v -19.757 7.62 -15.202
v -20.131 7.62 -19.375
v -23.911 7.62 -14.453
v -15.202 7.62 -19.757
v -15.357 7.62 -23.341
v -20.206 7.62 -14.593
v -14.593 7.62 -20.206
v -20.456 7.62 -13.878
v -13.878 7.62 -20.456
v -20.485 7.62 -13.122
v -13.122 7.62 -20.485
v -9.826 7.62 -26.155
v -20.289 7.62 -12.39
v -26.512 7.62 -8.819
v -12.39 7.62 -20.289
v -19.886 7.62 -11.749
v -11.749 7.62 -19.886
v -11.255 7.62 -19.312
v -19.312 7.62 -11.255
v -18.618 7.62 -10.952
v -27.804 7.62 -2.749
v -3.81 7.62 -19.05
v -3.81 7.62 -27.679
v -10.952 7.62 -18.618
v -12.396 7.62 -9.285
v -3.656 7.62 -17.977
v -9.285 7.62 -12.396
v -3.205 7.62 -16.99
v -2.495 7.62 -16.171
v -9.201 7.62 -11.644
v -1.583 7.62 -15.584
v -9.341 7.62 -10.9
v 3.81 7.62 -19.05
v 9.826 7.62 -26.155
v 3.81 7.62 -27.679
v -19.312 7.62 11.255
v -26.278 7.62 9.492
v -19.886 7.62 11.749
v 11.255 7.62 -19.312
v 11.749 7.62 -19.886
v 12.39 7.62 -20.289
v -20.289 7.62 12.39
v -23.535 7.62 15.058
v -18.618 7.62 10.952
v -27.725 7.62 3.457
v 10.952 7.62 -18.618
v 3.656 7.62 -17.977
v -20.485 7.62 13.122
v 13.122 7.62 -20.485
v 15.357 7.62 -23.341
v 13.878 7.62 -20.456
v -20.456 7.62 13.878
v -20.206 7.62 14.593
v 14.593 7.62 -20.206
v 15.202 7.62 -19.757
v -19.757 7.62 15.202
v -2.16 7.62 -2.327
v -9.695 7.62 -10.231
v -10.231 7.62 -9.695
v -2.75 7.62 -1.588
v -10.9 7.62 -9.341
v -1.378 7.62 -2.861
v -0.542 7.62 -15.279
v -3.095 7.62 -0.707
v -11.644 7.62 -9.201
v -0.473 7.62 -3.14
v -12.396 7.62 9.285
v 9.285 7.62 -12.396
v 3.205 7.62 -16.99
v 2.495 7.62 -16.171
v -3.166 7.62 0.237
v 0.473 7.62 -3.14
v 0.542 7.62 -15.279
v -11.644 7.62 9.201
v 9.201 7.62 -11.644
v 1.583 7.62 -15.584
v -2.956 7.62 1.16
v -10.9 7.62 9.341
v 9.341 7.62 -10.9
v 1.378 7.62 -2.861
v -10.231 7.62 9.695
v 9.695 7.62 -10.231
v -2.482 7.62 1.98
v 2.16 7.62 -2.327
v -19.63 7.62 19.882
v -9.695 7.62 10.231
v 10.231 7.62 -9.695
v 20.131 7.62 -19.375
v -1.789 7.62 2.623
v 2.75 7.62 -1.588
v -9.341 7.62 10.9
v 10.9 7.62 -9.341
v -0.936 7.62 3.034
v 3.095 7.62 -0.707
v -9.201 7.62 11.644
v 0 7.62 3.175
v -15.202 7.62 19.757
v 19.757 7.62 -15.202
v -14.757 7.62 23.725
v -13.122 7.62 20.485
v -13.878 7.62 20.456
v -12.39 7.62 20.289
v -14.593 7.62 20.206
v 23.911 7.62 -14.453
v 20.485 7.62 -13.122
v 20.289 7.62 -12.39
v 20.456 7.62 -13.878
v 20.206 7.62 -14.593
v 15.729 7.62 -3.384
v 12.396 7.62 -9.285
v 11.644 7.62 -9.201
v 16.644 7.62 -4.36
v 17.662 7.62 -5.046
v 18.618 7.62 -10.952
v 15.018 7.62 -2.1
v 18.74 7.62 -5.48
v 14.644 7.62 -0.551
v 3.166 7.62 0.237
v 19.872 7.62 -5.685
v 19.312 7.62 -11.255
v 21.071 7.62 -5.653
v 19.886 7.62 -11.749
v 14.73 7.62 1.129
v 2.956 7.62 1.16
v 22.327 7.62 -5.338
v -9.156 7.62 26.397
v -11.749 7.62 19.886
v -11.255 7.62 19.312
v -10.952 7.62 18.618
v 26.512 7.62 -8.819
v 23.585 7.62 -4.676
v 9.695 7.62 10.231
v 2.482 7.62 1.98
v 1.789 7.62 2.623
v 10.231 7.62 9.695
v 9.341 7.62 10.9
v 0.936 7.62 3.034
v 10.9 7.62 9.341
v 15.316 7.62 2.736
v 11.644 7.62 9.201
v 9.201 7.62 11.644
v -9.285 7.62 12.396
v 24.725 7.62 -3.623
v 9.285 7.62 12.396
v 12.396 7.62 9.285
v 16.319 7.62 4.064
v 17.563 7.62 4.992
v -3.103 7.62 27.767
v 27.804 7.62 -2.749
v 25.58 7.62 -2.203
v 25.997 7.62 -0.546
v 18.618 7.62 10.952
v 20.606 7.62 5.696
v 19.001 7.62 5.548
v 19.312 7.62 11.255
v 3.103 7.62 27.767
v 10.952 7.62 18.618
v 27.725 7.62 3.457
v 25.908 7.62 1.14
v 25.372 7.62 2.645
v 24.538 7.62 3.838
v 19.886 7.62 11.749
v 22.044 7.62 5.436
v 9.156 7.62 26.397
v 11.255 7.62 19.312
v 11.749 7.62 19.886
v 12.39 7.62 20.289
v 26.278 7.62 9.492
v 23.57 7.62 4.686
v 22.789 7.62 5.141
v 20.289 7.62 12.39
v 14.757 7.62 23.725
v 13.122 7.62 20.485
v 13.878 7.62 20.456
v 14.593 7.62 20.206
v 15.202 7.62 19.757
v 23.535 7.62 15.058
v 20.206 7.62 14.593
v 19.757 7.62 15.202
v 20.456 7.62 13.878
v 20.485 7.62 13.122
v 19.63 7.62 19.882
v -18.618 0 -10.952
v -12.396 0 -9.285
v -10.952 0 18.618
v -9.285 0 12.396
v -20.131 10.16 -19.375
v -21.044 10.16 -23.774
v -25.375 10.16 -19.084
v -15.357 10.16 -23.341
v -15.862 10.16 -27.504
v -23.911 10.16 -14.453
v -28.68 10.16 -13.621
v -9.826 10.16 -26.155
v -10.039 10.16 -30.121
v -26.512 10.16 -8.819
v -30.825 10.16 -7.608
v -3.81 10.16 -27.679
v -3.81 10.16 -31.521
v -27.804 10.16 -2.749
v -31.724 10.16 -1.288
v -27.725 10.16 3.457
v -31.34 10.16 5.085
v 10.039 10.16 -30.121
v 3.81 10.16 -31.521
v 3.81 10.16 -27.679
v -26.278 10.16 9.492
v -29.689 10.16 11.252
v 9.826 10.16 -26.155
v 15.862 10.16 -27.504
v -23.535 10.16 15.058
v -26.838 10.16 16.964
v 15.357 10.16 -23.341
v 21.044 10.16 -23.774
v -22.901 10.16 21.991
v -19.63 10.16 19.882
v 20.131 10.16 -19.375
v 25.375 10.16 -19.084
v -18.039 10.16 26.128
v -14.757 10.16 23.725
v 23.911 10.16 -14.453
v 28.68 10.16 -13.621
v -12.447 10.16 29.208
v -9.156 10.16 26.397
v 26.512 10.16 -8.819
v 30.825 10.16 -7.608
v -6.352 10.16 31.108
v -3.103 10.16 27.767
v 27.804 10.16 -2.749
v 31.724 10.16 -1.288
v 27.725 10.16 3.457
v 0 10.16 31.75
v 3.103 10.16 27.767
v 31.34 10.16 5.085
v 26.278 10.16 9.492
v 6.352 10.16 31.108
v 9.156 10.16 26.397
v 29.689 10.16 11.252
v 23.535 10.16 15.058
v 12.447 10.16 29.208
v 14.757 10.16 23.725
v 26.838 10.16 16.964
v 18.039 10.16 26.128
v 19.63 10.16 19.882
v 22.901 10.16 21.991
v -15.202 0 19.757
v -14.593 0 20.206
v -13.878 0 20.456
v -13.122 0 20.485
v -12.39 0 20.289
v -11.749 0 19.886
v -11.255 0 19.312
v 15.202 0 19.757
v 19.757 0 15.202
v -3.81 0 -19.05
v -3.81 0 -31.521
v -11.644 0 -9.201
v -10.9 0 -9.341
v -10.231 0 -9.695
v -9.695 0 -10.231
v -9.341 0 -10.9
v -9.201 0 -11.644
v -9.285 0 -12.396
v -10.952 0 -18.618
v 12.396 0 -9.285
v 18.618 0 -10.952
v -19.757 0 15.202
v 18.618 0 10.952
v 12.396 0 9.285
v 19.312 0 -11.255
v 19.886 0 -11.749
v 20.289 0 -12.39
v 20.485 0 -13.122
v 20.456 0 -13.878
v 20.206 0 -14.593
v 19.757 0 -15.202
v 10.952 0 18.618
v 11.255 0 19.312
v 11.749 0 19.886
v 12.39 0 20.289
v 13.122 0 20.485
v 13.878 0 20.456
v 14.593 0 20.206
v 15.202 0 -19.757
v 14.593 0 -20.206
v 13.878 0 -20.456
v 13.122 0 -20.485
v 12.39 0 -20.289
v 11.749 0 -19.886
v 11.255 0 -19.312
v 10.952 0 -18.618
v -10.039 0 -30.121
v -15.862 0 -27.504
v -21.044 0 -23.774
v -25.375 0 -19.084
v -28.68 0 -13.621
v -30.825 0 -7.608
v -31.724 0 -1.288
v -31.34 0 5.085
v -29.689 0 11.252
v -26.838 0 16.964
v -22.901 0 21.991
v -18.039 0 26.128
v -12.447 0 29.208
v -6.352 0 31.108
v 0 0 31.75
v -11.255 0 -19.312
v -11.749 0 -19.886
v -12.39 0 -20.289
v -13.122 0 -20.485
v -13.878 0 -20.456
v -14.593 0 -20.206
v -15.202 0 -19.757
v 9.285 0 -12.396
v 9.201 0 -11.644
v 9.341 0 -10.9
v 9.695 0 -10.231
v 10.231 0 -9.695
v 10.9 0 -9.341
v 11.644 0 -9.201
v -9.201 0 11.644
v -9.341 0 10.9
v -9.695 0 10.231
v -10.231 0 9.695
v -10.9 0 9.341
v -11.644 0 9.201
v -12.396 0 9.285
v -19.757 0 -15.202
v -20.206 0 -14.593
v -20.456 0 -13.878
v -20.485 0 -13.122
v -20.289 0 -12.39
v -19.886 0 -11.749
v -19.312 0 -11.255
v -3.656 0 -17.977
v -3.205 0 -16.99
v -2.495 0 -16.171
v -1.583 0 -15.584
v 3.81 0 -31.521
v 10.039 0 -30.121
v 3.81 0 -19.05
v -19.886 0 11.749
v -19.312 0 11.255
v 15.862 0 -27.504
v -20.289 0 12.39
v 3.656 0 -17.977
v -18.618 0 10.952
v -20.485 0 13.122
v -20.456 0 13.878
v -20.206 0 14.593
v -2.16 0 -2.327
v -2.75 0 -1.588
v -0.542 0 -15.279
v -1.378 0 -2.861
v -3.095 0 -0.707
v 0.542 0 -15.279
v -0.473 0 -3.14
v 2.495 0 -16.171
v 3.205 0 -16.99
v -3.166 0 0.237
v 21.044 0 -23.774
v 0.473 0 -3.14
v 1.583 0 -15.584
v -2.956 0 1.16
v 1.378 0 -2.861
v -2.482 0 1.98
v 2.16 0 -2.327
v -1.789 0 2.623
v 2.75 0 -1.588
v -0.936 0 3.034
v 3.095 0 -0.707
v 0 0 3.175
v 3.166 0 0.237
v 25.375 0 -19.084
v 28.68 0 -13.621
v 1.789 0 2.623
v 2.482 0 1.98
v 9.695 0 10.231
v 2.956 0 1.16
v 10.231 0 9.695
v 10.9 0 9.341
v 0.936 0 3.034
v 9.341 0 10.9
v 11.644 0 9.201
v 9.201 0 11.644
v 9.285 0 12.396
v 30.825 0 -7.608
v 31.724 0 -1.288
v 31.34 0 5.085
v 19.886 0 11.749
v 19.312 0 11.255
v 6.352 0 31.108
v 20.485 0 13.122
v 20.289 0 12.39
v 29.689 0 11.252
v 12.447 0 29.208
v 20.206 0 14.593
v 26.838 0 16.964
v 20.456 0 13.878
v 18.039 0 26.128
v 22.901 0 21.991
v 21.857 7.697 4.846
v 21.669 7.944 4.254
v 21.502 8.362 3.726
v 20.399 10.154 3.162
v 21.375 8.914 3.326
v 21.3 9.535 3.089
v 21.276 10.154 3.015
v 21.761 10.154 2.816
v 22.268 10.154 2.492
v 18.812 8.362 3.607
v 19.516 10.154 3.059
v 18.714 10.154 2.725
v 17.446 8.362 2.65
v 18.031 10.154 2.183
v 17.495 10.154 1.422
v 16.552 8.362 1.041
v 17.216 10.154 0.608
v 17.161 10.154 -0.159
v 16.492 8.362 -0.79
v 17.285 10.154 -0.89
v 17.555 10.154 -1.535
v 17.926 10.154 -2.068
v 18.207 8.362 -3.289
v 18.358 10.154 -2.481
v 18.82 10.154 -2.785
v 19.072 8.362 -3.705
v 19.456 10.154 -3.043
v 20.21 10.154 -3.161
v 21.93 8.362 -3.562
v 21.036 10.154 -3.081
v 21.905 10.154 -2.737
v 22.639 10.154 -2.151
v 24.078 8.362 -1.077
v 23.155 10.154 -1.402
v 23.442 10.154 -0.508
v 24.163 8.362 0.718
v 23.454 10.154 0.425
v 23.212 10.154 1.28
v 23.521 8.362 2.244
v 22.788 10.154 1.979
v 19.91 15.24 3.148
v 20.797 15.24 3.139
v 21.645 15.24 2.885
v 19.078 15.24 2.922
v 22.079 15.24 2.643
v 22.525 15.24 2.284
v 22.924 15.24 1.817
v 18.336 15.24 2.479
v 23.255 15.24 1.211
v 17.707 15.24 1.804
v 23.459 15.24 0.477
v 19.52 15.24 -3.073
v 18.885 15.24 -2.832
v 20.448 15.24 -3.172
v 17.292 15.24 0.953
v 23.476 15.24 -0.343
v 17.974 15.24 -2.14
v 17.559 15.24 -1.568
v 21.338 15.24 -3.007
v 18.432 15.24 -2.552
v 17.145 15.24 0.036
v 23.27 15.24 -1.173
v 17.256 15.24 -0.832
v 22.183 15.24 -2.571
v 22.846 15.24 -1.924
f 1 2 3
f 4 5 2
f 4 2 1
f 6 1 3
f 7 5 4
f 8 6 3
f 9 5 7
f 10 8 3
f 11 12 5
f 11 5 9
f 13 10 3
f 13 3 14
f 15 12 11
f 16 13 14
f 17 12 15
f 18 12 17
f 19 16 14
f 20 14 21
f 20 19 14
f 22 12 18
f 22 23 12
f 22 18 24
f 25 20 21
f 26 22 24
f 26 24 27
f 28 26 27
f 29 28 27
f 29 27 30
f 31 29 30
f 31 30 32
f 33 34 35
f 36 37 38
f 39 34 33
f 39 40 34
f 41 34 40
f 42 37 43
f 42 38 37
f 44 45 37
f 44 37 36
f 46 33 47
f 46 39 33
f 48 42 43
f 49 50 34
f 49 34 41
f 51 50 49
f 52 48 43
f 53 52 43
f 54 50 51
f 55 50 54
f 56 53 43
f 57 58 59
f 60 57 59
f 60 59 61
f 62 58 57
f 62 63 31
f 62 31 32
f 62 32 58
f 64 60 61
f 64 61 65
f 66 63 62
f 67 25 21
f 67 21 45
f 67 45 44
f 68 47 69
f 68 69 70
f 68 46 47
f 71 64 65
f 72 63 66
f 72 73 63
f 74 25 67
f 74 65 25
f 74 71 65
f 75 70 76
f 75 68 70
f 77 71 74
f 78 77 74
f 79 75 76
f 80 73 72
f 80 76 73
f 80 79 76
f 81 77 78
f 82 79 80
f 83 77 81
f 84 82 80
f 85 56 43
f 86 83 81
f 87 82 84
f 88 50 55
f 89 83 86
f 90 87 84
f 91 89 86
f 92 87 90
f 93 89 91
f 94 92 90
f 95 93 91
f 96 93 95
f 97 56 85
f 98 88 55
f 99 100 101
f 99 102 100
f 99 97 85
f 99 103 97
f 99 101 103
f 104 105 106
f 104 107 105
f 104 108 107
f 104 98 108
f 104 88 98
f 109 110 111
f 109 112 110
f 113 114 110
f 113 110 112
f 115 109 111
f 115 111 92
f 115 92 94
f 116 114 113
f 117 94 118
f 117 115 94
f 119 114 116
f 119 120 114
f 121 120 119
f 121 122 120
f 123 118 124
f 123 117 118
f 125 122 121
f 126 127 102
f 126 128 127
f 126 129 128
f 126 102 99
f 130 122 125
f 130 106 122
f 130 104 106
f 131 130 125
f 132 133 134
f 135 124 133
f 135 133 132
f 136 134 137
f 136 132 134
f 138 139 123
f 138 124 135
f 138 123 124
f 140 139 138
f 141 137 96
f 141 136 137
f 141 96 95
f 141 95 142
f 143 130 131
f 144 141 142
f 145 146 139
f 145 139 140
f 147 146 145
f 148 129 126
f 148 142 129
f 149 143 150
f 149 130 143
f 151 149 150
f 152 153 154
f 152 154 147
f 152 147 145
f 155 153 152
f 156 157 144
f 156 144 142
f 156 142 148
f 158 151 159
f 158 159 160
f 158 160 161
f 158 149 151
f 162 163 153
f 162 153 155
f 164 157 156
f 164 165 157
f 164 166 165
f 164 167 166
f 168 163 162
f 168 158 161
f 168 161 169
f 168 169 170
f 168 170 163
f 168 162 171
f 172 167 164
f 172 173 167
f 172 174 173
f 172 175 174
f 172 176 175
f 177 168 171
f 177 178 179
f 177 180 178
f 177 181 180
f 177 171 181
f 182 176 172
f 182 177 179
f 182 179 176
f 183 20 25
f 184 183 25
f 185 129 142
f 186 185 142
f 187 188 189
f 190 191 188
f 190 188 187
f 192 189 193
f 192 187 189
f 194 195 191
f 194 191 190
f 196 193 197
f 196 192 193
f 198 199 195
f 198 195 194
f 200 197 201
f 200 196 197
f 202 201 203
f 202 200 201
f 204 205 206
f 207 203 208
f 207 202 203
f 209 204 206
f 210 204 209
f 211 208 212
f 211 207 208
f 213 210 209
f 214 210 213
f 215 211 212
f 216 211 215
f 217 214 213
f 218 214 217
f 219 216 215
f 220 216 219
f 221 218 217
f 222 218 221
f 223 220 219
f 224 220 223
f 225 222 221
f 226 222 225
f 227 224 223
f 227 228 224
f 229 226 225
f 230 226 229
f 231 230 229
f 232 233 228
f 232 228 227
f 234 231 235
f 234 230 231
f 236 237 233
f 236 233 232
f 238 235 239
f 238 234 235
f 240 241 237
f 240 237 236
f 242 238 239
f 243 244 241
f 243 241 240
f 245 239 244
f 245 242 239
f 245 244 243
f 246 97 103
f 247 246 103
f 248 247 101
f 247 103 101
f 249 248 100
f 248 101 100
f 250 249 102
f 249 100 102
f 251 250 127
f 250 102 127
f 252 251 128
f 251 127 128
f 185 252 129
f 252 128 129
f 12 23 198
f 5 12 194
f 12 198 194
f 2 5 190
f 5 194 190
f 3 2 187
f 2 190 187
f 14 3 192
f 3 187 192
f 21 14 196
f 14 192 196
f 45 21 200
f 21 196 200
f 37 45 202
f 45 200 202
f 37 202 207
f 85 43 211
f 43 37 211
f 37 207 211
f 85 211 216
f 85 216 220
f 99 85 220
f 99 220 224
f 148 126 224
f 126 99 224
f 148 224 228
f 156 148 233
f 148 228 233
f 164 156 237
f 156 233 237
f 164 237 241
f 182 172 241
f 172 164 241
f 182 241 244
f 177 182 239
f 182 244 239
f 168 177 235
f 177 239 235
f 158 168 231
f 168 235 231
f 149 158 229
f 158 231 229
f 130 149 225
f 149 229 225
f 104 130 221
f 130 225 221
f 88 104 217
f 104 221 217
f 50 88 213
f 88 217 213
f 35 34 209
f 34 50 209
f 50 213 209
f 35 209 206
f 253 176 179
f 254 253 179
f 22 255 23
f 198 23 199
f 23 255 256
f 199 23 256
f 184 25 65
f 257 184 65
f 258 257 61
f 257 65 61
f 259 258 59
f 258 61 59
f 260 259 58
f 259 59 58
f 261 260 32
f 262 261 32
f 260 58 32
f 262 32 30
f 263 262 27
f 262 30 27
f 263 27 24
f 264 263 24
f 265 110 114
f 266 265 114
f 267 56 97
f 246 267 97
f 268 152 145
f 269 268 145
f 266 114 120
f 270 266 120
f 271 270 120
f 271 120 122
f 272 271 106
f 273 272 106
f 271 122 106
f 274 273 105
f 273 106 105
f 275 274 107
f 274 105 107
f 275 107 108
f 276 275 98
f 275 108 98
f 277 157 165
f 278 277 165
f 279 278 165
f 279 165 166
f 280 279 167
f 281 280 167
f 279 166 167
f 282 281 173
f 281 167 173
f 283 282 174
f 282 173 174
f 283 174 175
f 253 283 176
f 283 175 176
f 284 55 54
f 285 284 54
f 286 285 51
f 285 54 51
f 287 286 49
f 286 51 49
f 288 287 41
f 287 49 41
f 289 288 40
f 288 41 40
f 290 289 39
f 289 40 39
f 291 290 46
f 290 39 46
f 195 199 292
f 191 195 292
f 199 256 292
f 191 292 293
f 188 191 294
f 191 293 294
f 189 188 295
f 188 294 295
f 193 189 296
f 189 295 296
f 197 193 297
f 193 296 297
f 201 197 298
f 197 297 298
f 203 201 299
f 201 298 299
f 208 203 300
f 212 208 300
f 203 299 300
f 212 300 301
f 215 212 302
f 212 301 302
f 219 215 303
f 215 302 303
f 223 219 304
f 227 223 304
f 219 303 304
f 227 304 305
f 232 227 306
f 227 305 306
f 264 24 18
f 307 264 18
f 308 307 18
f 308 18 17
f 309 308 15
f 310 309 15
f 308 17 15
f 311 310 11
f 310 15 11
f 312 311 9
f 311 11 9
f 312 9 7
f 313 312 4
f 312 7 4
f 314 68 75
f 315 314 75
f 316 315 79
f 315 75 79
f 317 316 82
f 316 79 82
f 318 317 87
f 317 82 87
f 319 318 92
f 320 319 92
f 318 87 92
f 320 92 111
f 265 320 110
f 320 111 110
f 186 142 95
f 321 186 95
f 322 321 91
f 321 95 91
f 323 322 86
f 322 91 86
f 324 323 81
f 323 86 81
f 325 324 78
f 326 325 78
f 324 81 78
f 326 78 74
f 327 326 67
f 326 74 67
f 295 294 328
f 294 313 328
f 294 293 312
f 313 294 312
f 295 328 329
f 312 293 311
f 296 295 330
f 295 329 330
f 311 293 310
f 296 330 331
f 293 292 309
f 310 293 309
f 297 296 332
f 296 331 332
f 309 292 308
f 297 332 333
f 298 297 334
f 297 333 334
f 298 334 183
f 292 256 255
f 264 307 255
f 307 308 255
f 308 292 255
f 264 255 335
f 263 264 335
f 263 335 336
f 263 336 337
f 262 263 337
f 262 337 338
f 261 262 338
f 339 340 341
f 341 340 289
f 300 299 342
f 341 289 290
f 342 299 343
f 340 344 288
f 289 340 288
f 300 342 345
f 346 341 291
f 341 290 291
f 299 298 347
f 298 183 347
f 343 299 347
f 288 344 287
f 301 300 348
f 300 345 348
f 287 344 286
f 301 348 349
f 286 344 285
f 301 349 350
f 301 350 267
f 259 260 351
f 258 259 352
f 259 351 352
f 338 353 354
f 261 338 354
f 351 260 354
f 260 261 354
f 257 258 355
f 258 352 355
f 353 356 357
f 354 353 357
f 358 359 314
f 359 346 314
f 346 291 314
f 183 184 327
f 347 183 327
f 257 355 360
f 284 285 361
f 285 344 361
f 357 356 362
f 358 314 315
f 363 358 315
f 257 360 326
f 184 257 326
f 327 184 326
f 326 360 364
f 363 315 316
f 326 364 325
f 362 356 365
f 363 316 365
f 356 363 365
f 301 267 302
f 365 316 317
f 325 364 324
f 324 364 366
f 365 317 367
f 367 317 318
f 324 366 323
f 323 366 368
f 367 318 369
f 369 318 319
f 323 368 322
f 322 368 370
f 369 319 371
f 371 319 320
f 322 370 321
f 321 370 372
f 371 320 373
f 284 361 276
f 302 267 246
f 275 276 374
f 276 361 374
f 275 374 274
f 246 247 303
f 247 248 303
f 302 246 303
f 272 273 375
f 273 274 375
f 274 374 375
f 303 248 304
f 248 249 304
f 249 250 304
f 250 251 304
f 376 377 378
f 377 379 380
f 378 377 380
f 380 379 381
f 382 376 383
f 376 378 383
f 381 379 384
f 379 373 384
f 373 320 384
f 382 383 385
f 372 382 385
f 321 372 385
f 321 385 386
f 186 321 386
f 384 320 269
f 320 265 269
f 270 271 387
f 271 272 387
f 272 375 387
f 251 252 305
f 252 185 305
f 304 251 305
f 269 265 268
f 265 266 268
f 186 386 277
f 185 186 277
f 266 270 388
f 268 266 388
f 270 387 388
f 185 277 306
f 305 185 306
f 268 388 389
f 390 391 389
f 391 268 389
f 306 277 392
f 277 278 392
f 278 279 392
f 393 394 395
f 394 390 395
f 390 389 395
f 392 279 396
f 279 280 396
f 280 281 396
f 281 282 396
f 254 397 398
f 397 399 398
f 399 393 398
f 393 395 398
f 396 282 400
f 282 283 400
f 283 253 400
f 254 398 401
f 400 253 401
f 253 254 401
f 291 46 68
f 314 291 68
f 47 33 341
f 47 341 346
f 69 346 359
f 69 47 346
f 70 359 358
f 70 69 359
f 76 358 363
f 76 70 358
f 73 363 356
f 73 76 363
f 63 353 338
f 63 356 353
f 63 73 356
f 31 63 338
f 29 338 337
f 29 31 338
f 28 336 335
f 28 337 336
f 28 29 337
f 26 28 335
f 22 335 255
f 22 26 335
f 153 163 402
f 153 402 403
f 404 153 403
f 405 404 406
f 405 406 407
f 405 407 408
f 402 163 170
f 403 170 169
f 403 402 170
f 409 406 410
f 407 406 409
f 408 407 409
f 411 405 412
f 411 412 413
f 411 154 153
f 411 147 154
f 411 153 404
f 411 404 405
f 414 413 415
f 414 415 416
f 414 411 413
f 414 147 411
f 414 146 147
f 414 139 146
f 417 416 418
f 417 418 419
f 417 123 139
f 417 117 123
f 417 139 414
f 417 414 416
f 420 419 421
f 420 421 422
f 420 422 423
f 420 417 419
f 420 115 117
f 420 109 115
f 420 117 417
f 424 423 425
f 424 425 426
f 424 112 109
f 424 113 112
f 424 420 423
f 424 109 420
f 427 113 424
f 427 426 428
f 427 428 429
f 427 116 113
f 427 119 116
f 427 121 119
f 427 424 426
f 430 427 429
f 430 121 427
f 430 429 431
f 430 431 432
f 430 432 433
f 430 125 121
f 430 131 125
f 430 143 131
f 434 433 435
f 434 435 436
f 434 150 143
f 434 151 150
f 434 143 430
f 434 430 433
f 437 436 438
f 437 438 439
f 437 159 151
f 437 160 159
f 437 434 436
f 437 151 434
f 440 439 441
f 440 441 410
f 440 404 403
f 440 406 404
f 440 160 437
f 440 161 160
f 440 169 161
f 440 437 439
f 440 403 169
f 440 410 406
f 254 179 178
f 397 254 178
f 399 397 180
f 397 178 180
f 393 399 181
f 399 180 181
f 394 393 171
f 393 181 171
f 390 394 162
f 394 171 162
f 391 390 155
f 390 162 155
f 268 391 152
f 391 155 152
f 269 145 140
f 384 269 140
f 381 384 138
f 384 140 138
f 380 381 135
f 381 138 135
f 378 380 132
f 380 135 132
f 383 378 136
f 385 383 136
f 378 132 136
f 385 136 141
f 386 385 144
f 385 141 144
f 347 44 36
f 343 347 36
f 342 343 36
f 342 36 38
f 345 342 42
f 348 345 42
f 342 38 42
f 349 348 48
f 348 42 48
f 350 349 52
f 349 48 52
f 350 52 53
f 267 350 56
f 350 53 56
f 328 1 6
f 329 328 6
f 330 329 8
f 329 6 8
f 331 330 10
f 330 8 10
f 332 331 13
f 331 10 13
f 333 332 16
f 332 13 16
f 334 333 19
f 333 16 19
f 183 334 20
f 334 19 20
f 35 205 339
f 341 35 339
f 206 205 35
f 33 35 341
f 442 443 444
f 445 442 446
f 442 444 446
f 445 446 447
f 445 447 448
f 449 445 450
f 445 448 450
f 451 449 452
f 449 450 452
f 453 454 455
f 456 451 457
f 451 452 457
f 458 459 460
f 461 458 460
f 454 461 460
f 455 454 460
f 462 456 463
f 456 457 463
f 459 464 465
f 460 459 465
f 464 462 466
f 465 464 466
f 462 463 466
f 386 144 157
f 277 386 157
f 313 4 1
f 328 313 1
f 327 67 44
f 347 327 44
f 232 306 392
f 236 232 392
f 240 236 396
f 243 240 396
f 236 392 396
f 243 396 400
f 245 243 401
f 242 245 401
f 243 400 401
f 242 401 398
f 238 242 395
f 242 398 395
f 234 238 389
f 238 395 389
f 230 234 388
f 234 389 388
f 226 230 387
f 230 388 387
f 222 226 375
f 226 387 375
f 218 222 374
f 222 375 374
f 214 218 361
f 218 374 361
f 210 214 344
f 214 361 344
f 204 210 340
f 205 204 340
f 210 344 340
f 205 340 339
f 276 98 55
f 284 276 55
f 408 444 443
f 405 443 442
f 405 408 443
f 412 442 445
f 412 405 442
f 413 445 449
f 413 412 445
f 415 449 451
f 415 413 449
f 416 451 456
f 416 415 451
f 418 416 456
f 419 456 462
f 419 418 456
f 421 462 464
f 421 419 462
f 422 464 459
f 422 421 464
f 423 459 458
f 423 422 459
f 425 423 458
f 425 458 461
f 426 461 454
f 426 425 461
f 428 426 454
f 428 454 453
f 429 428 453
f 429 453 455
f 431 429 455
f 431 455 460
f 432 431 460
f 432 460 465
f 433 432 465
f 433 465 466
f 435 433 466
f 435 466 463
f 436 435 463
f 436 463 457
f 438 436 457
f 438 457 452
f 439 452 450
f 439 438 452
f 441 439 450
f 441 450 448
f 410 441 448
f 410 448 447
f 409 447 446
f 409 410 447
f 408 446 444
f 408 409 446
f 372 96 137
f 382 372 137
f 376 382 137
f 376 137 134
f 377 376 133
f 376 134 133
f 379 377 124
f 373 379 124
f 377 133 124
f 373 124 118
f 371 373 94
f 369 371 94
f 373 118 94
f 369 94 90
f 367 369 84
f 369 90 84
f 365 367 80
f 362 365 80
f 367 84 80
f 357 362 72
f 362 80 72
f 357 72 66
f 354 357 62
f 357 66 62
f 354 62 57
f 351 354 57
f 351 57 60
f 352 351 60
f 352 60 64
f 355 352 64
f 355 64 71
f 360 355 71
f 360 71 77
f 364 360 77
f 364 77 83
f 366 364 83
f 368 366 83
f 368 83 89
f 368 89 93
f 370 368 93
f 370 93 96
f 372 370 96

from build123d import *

# Parameters (mm, degrees)
SKETCH1_R           = 31.75
BOSS_EXTRUDE3_DEPTH = 10.16
SKETCH3_R           = 27.94
CUT_EXTRUDE1_DEPTH  = 2.54
SKETCH4_R           = 3.175
CUT_EXTRUDE2_DEPTH  = 46.543269536
CUT_EXTRUDE3_DEPTH  = 46.543269536
CUT_EXTRUDE4_DEPTH  = 46.543269536
FILLET1_R           = 2.54


with BuildPart() as part:
    # Sketch1 → Boss-Extrude3 (new body)
    with BuildSketch(Plane(origin=(0, 0, 0), x_dir=(1, 0, 0), z_dir=(0, 1, 0))):
        with Locations(Location((0, 0, 0), (0, 0, 270))):
            Circle(SKETCH1_R)
    extrude(amount=BOSS_EXTRUDE3_DEPTH)

    # Sketch3 → Cut-Extrude1 (cut)
    with BuildSketch(Plane(origin=(0, 10.16, 0), x_dir=(1, 0, 0), z_dir=(0, 1, 0))):
        with Locations(Location((0, 0, 0), (0, 0, 270))):
            Circle(SKETCH3_R)
    extrude(amount=-CUT_EXTRUDE1_DEPTH, mode=Mode.SUBTRACT)

    # Sketch4 → Cut-Extrude2 (cut, through all)
    with BuildSketch(Plane(origin=(0, 7.62, 0), x_dir=(1, 0, 0), z_dir=(0, 1, 0))):
        with Locations(Location((0, 0, 0), (0, 0, 270))):
            Circle(SKETCH4_R)
    extrude(amount=-CUT_EXTRUDE2_DEPTH, mode=Mode.SUBTRACT)

    # Sketch5 → Cut-Extrude3 (cut, through all)
    with BuildSketch(Plane(origin=(0, 7.62, 0), x_dir=(1, 0, 0), z_dir=(0, 1, 0))):
        with BuildLine():
            Line((12.39620867, 9.285356697), (18.617912617, 10.952457245))
            ThreePointArc((18.617912617, 10.952457245), (20.413963841, 12.748508469), (19.756563466, 15.201960068))
            Line((19.756563466, 15.201960068), (15.201960068, 19.756563466))
            ThreePointArc((15.201960068, 19.756563466), (12.748508469, 20.413963841), (10.952457245, 18.617912617))
            Line((10.952457245, 18.617912617), (9.285356697, 12.39620867))
            ThreePointArc((9.285356697, 12.39620867), (9.942757071, 9.942757071), (12.39620867, 9.285356697))
        make_face()
        with BuildLine():
            Line((9.285356697, -12.39620867), (10.952457245, -18.617912617))
            ThreePointArc((10.952457245, -18.617912617), (12.748508469, -20.413963841), (15.201960068, -19.756563466))
            Line((15.201960068, -19.756563466), (19.756563466, -15.201960068))
            ThreePointArc((19.756563466, -15.201960068), (20.413963841, -12.748508469), (18.617912617, -10.952457245))
            Line((18.617912617, -10.952457245), (12.39620867, -9.285356697))
            ThreePointArc((12.39620867, -9.285356697), (9.942757071, -9.942757071), (9.285356697, -12.39620867))
        make_face()
        with BuildLine():
            Line((-12.39620867, -9.285356697), (-18.617912617, -10.952457245))
            ThreePointArc((-18.617912617, -10.952457245), (-20.413963841, -12.748508469), (-19.756563466, -15.201960068))
            Line((-19.756563466, -15.201960068), (-15.201960068, -19.756563466))
            ThreePointArc((-15.201960068, -19.756563466), (-12.748508469, -20.413963841), (-10.952457245, -18.617912617))
            Line((-10.952457245, -18.617912617), (-9.285356697, -12.39620867))
            ThreePointArc((-9.285356697, -12.39620867), (-9.942757071, -9.942757071), (-12.39620867, -9.285356697))
        make_face()
        with BuildLine():
            Line((-9.285356697, 12.39620867), (-10.952457245, 18.617912617))
            ThreePointArc((-10.952457245, 18.617912617), (-12.748508469, 20.413963841), (-15.201960068, 19.756563466))
            Line((-15.201960068, 19.756563466), (-19.756563466, 15.201960068))
            ThreePointArc((-19.756563466, 15.201960068), (-20.413963841, 12.748508469), (-18.617912617, 10.952457245))
            Line((-18.617912617, 10.952457245), (-12.39620867, 9.285356697))
            ThreePointArc((-12.39620867, 9.285356697), (-9.942757071, 9.942757071), (-9.285356697, 12.39620867))
        make_face()
        with BuildLine():
            Line((-3.81, 19.05), (-3.81, 34.374285303))
            Line((-3.81, 34.374285303), (3.81, 34.374285303))
            Line((3.81, 34.374285303), (3.81, 19.05))
            ThreePointArc((3.81, 19.05), (0, 15.24), (-3.81, 19.05))
        make_face()
    extrude(amount=-CUT_EXTRUDE3_DEPTH, mode=Mode.SUBTRACT)

    # Sketch5<2> → Cut-Extrude4 (cut, through all)
    with BuildSketch(Plane(origin=(0, 7.62, 0), x_dir=(1, 0, 0), z_dir=(0, 1, 0))):
        with BuildLine():
            Line((12.39620867, 9.285356697), (18.617912617, 10.952457245))
            ThreePointArc((18.617912617, 10.952457245), (20.413963841, 12.748508469), (19.756563466, 15.201960068))
            Line((19.756563466, 15.201960068), (15.201960068, 19.756563466))
            ThreePointArc((15.201960068, 19.756563466), (12.748508469, 20.413963841), (10.952457245, 18.617912617))
            Line((10.952457245, 18.617912617), (9.285356697, 12.39620867))
            ThreePointArc((9.285356697, 12.39620867), (9.942757071, 9.942757071), (12.39620867, 9.285356697))
        make_face()
        with BuildLine():
            Line((9.285356697, -12.39620867), (10.952457245, -18.617912617))
            ThreePointArc((10.952457245, -18.617912617), (12.748508469, -20.413963841), (15.201960068, -19.756563466))
            Line((15.201960068, -19.756563466), (19.756563466, -15.201960068))
            ThreePointArc((19.756563466, -15.201960068), (20.413963841, -12.748508469), (18.617912617, -10.952457245))
            Line((18.617912617, -10.952457245), (12.39620867, -9.285356697))
            ThreePointArc((12.39620867, -9.285356697), (9.942757071, -9.942757071), (9.285356697, -12.39620867))
        make_face()
        with BuildLine():
            Line((-12.39620867, -9.285356697), (-18.617912617, -10.952457245))
            ThreePointArc((-18.617912617, -10.952457245), (-20.413963841, -12.748508469), (-19.756563466, -15.201960068))
            Line((-19.756563466, -15.201960068), (-15.201960068, -19.756563466))
            ThreePointArc((-15.201960068, -19.756563466), (-12.748508469, -20.413963841), (-10.952457245, -18.617912617))
            Line((-10.952457245, -18.617912617), (-9.285356697, -12.39620867))
            ThreePointArc((-9.285356697, -12.39620867), (-9.942757071, -9.942757071), (-12.39620867, -9.285356697))
        make_face()
        with BuildLine():
            Line((-9.285356697, 12.39620867), (-10.952457245, 18.617912617))
            ThreePointArc((-10.952457245, 18.617912617), (-12.748508469, 20.413963841), (-15.201960068, 19.756563466))
            Line((-15.201960068, 19.756563466), (-19.756563466, 15.201960068))
            ThreePointArc((-19.756563466, 15.201960068), (-20.413963841, 12.748508469), (-18.617912617, 10.952457245))
            Line((-18.617912617, 10.952457245), (-12.39620867, 9.285356697))
            ThreePointArc((-12.39620867, 9.285356697), (-9.942757071, 9.942757071), (-9.285356697, 12.39620867))
        make_face()
        with BuildLine():
            Line((-3.81, 19.05), (-3.81, 34.374285303))
            Line((-3.81, 34.374285303), (3.81, 34.374285303))
            Line((3.81, 34.374285303), (3.81, 19.05))
            ThreePointArc((3.81, 19.05), (0, 15.24), (-3.81, 19.05))
        make_face()
    extrude(amount=CUT_EXTRUDE4_DEPTH, mode=Mode.SUBTRACT)

    # Loft4: read off the stored shape, not the designer's step
    # Loft4: loft between two sections, ruled curve by curve
    loft4_from = [
        Edge.make_bspline([(21.644950372, 15.24, 2.885330399), (15.874289575, 15.24, 5.535231144), (13.22438883, 15.24, -0.235429654), (18.995049628, 15.24, -2.885330399), (24.765710425, 15.24, -5.535231144), (27.41561117, 15.24, 0.235429654), (21.644950372, 15.24, 2.885330399)], [0, 0, 0, 0, 0.5, 0.5, 0.5, 1, 1, 1, 1], 3, [1, 0.333333333, 0.333333333, 1, 0.333333333, 0.333333333, 1]),
    ]
    loft4_to = [
        Edge.make_bspline([(21.092187722, 7.62, 3.079667372), (14.932852978, 7.62, 4.624042816), (13.388477534, 7.62, -1.535291928), (19.547812278, 7.62, -3.079667372), (25.707147022, 7.62, -4.624042816), (27.251522466, 7.62, 1.535291928), (21.092187722, 7.62, 3.079667372)], [0, 0, 0, 0, 0.5, 0.5, 0.5, 1, 1, 1, 1], 3, [1, 0.333333333, 0.333333333, 1, 0.333333333, 0.333333333, 1]),
    ]
    loft4 = Solid(Shell([*[Face.make_surface_from_curves(loft4_from[k], loft4_to[k]) for k in range(1)], Face(Wire(loft4_from)), Face(Wire(loft4_to))]))
    add(loft4)

    # Fillet1
    fillet1_edges = [part.edges().sort_by_distance(p)[0] for p in [
        (19.547812278, 7.62, -3.079667372),
    ]]
    fillet(fillet1_edges, radius=FILLET1_R)


solid = part.part
